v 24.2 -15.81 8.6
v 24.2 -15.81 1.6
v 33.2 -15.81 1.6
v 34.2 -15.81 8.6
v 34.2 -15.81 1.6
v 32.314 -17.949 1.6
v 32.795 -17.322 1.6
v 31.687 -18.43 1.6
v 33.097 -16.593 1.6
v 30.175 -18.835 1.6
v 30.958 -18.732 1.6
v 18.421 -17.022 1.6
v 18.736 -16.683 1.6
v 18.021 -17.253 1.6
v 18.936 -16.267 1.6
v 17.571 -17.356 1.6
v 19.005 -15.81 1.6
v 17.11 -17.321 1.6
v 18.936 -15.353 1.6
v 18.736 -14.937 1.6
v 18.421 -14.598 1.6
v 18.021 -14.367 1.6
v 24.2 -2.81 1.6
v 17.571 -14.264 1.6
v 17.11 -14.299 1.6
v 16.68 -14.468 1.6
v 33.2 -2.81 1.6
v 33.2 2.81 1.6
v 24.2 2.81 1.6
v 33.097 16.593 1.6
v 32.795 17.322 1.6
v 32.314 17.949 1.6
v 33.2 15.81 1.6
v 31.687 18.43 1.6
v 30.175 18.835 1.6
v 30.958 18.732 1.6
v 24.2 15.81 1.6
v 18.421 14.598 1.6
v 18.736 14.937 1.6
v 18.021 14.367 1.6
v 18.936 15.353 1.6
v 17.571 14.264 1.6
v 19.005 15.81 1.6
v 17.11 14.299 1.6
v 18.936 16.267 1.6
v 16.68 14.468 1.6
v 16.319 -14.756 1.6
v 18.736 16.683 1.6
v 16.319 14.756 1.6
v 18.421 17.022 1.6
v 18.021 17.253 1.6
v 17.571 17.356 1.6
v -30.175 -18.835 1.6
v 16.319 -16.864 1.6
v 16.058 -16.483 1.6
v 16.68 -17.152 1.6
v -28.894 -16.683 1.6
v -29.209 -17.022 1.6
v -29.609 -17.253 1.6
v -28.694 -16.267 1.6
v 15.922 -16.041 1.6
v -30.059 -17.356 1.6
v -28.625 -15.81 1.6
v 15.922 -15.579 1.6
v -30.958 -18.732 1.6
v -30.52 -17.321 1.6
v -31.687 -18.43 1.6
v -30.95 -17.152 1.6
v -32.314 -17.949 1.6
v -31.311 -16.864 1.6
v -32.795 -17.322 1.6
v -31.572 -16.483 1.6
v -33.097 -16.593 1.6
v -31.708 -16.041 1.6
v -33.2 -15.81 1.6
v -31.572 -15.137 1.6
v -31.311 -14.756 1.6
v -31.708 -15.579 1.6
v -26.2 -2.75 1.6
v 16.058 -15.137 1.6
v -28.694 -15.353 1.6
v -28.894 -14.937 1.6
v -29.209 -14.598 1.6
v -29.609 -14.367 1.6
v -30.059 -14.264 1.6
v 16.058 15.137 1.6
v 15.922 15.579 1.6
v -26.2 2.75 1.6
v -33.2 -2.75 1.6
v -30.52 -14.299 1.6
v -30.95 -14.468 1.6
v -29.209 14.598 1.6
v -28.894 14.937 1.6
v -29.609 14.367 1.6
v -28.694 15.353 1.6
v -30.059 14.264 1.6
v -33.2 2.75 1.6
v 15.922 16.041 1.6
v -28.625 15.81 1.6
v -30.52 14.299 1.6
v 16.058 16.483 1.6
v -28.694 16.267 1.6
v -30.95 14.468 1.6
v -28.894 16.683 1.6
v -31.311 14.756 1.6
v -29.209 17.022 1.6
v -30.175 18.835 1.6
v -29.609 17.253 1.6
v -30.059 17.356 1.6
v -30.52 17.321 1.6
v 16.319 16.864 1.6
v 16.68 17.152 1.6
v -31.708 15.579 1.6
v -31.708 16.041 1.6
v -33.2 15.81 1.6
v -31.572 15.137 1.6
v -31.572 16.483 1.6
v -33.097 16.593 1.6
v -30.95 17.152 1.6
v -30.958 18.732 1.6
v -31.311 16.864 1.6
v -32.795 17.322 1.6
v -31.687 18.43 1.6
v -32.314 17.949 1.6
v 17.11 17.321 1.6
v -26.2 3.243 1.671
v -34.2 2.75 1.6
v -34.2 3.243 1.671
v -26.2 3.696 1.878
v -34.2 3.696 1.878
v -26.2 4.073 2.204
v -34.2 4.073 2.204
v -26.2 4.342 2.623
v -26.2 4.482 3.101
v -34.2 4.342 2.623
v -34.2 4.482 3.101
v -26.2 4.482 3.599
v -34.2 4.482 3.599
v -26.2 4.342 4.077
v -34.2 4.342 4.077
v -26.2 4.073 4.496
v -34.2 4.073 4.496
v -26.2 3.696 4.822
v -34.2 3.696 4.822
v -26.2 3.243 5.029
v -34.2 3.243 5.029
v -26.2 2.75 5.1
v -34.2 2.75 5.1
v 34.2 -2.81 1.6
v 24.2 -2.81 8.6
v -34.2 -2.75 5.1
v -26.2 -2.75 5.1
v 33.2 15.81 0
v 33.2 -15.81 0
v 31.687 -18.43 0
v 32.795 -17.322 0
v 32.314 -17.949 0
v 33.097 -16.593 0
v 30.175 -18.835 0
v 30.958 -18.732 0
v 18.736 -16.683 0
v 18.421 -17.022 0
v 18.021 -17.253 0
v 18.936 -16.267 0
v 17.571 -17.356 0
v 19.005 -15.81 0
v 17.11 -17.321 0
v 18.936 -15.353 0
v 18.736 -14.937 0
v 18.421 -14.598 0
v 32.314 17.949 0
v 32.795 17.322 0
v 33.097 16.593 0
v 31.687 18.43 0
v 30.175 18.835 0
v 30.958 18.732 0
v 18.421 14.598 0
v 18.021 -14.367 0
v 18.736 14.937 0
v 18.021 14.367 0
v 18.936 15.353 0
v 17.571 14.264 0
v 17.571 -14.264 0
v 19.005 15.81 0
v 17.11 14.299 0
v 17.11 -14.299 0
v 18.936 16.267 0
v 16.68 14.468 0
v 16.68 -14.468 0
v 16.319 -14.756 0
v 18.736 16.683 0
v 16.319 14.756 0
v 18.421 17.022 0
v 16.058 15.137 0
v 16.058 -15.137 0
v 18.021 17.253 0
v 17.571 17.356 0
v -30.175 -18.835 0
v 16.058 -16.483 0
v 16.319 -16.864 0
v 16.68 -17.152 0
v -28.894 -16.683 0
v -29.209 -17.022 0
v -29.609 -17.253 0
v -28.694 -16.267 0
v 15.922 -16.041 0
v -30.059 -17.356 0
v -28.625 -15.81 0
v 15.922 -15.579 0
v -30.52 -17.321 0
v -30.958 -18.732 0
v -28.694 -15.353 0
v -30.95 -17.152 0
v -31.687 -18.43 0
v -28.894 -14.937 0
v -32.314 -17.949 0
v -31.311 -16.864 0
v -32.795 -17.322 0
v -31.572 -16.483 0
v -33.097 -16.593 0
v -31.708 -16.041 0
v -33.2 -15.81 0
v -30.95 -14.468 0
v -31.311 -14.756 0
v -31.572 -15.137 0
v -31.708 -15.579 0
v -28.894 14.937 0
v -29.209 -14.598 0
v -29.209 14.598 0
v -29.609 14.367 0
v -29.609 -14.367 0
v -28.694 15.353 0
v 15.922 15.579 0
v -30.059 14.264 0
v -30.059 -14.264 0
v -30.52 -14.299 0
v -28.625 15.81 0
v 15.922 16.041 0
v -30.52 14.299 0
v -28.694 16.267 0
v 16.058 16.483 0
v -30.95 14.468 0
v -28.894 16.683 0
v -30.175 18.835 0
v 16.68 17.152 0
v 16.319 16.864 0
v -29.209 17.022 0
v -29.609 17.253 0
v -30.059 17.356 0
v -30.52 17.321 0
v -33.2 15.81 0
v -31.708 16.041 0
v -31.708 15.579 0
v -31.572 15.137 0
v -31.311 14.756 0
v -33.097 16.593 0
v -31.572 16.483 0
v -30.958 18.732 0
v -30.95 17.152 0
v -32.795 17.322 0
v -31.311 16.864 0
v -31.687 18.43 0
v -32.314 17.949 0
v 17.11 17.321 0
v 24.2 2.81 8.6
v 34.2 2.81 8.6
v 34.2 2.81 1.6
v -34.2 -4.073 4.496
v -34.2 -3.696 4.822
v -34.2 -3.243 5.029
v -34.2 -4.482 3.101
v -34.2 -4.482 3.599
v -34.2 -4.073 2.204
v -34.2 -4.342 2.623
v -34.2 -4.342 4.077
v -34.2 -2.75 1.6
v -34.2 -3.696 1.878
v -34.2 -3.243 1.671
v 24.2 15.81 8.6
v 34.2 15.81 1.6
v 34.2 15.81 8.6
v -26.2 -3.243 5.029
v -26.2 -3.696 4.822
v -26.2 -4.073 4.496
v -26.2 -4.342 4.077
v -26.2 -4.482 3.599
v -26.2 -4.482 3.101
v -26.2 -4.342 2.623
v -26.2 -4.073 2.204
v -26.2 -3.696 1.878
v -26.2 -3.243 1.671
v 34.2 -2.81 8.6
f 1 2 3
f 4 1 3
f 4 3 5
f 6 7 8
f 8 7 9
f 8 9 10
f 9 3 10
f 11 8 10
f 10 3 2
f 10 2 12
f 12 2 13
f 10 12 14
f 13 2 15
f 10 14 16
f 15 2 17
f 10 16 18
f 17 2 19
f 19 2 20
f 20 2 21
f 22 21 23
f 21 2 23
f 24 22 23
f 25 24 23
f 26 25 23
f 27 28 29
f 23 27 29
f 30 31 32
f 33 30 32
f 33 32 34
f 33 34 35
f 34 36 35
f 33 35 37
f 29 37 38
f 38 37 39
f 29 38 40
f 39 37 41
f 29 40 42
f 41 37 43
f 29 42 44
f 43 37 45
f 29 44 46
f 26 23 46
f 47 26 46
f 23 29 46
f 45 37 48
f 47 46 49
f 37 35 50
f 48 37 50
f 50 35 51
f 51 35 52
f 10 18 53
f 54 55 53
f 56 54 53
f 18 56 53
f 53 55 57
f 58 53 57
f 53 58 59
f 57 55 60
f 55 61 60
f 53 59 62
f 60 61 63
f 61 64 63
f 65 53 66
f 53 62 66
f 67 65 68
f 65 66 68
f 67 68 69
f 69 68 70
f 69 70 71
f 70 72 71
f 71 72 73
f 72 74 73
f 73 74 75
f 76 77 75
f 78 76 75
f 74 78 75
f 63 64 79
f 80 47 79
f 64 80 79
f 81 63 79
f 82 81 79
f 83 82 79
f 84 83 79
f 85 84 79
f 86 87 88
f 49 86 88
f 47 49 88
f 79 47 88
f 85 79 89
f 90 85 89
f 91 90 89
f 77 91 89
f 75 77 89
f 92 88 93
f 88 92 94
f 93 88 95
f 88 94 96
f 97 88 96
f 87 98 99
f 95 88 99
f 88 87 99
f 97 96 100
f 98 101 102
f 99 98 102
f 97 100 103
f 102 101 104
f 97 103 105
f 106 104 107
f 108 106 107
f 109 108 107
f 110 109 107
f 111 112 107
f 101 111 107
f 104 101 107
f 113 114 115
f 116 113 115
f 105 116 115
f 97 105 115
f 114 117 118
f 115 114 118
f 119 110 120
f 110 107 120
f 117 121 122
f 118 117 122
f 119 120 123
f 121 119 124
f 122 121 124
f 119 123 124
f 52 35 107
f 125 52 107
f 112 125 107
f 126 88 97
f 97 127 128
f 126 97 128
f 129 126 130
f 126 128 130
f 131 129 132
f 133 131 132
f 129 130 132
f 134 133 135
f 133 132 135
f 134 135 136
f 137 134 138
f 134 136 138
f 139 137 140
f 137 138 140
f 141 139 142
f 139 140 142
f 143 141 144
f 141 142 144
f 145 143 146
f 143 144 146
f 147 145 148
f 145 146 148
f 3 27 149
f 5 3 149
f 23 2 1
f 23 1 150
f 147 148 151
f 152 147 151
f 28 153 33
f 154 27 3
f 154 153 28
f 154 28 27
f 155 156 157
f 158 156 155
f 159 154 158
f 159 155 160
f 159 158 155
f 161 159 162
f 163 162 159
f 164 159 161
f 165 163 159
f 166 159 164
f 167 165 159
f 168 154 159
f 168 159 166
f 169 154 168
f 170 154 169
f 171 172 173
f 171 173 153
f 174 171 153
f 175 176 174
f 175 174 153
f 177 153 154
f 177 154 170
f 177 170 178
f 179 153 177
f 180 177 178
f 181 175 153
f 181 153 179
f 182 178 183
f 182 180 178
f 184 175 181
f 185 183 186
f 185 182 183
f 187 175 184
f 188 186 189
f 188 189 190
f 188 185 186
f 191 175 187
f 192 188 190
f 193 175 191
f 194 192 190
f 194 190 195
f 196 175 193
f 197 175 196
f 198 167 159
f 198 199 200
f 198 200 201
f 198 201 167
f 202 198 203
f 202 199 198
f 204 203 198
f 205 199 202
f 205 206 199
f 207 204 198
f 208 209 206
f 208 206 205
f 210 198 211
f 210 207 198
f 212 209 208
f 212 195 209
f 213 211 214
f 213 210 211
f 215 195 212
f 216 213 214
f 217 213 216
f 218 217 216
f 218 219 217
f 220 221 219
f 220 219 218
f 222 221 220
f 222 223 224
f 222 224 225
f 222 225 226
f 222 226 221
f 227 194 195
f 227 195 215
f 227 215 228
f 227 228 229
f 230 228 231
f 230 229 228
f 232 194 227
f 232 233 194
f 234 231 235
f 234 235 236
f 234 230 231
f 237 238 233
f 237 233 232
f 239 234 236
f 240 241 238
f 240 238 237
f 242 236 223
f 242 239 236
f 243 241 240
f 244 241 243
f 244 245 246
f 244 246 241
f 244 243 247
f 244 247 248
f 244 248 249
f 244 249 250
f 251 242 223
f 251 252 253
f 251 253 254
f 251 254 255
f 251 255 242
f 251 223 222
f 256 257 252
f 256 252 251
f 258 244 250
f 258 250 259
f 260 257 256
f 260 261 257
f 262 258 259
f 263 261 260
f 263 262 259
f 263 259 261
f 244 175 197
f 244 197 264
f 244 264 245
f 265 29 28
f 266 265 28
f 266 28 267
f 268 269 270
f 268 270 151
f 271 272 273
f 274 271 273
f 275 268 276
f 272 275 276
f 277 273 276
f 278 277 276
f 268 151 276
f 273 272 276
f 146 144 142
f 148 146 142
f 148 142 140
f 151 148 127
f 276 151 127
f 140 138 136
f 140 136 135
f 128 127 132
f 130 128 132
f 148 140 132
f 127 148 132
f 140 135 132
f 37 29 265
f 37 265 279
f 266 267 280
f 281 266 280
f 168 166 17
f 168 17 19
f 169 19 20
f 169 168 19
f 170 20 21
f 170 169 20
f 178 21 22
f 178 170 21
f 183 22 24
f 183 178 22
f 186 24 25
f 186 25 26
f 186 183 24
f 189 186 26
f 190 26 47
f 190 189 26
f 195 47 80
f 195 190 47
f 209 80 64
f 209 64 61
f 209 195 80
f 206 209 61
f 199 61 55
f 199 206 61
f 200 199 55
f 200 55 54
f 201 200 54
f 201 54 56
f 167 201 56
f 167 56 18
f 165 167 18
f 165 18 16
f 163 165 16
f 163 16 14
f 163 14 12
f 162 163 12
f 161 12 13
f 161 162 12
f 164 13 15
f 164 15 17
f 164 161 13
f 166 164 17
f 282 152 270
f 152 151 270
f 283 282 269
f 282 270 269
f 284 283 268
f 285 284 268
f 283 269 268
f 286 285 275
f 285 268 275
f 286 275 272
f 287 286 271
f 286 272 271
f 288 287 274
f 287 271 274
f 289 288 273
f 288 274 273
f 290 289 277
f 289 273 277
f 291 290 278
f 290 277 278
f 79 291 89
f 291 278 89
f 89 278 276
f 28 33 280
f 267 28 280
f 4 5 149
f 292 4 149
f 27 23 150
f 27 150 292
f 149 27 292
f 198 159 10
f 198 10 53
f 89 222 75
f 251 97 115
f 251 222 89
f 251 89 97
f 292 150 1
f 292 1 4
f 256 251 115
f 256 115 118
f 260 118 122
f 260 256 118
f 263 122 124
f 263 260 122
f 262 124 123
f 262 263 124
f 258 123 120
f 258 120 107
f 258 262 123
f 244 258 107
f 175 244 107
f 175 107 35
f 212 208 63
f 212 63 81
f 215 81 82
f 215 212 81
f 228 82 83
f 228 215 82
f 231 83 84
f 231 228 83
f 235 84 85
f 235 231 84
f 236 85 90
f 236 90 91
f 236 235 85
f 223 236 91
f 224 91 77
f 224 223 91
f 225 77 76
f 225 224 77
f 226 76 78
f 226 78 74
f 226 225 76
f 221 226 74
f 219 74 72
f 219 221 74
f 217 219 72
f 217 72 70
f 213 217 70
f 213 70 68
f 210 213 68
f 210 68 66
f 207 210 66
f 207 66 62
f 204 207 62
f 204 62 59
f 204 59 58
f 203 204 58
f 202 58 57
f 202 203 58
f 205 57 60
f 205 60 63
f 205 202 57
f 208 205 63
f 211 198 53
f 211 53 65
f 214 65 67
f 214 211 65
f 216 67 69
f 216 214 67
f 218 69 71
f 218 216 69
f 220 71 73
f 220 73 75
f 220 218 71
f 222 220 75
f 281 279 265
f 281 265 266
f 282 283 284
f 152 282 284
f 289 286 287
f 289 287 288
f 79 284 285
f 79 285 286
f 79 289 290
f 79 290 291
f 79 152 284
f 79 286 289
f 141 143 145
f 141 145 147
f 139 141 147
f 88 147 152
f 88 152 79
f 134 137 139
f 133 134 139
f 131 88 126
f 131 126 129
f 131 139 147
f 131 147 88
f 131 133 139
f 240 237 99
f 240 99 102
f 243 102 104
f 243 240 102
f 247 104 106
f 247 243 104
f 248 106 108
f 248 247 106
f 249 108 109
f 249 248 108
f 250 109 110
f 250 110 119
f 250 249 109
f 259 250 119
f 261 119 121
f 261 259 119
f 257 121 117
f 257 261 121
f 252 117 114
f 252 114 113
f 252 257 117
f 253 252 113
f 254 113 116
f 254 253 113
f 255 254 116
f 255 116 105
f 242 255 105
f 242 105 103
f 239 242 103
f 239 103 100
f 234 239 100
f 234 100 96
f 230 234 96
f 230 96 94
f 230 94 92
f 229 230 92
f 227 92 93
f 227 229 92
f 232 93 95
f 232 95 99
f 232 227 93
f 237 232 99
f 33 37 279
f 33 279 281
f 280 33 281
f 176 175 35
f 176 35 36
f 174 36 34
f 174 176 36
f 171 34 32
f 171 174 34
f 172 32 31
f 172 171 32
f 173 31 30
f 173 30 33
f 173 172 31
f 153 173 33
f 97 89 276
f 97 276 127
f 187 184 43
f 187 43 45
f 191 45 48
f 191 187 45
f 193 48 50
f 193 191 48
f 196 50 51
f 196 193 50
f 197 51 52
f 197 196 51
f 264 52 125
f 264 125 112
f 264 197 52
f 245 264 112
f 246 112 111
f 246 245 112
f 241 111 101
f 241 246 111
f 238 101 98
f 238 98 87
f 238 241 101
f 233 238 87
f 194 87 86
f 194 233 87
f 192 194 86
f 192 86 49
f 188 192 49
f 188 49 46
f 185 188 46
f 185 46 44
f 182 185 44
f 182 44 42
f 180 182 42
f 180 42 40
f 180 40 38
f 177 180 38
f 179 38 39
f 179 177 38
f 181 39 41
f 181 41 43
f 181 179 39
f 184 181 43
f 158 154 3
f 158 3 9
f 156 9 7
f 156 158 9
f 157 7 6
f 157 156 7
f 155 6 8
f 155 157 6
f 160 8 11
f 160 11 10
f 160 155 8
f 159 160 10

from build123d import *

# Parameters (mm, degrees)
ESBO_O1_R                     = 1.55
RESSALTO_EXTRUS_O1_DEPTH      = 1.6
ESBO_O2_W                     = 10
ESBO_O2_H                     = 13
RESSALTO_EXTRUS_O2_DEPTH      = 7
RESSALTO_EXTRUS_O3_DEPTH      = 1
RESSALTO_EXTRUS_O3_DEPTH_BACK = 7


with BuildPart() as part:
    # Esboço1 → Ressalto-extrusão1 (new body)
    with BuildSketch(Plane.XY):
        with BuildLine():
            Line((-30.175, 18.835), (30.175, 18.835))
            ThreePointArc((30.175, 18.835), (32.313998013, 17.948998013), (33.2, 15.81))
            Line((33.2, 15.81), (33.2, -15.81))
            ThreePointArc((33.2, -15.81), (32.313998013, -17.948998013), (30.175, -18.835))
            Line((30.175, -18.835), (-30.175, -18.835))
            ThreePointArc((-30.175, -18.835), (-32.313998013, -17.948998013), (-33.2, -15.81))
            Line((-33.2, -15.81), (-33.2, 15.81))
            ThreePointArc((-33.2, 15.81), (-32.313998013, 17.948998013), (-30.175, 18.835))
        make_face()
        with Locations((-30.175, 15.81)):
            Circle(ESBO_O1_R, mode=Mode.SUBTRACT)
        with Locations((-30.175, -15.81)):
            Circle(ESBO_O1_R, mode=Mode.SUBTRACT)
        with Locations((17.455, 15.81)):
            Circle(ESBO_O1_R, mode=Mode.SUBTRACT)
        with Locations((17.455, -15.81)):
            Circle(ESBO_O1_R, mode=Mode.SUBTRACT)
    extrude(amount=RESSALTO_EXTRUS_O1_DEPTH)

    # Esboço2 → Ressalto-extrusão2 (add)
    with BuildSketch(Plane.XY.offset(1.6)):
        with Locations((29.2, 9.31)):
            Rectangle(ESBO_O2_W, ESBO_O2_H)
        with Locations((29.2, -9.31)):
            Rectangle(ESBO_O2_W, ESBO_O2_H)
    extrude(amount=RESSALTO_EXTRUS_O2_DEPTH)

    # Esboço3 → Ressalto-extrusão3 (add, two sides)
    with BuildSketch(Plane.ZY.offset(33.2)) as ressalto_extrus_o3_sk:
        with BuildLine():
            Line((5.1, 2.75), (5.1, -2.75))
            ThreePointArc((5.1, -2.75), (3.35, -4.5), (1.6, -2.75))
            Line((1.6, -2.75), (1.6, 2.75))
            ThreePointArc((1.6, 2.75), (3.35, 4.5), (5.1, 2.75))
        make_face()
    extrude(amount=RESSALTO_EXTRUS_O3_DEPTH)
    extrude(ressalto_extrus_o3_sk.sketch, amount=-RESSALTO_EXTRUS_O3_DEPTH_BACK)


solid = part.part
